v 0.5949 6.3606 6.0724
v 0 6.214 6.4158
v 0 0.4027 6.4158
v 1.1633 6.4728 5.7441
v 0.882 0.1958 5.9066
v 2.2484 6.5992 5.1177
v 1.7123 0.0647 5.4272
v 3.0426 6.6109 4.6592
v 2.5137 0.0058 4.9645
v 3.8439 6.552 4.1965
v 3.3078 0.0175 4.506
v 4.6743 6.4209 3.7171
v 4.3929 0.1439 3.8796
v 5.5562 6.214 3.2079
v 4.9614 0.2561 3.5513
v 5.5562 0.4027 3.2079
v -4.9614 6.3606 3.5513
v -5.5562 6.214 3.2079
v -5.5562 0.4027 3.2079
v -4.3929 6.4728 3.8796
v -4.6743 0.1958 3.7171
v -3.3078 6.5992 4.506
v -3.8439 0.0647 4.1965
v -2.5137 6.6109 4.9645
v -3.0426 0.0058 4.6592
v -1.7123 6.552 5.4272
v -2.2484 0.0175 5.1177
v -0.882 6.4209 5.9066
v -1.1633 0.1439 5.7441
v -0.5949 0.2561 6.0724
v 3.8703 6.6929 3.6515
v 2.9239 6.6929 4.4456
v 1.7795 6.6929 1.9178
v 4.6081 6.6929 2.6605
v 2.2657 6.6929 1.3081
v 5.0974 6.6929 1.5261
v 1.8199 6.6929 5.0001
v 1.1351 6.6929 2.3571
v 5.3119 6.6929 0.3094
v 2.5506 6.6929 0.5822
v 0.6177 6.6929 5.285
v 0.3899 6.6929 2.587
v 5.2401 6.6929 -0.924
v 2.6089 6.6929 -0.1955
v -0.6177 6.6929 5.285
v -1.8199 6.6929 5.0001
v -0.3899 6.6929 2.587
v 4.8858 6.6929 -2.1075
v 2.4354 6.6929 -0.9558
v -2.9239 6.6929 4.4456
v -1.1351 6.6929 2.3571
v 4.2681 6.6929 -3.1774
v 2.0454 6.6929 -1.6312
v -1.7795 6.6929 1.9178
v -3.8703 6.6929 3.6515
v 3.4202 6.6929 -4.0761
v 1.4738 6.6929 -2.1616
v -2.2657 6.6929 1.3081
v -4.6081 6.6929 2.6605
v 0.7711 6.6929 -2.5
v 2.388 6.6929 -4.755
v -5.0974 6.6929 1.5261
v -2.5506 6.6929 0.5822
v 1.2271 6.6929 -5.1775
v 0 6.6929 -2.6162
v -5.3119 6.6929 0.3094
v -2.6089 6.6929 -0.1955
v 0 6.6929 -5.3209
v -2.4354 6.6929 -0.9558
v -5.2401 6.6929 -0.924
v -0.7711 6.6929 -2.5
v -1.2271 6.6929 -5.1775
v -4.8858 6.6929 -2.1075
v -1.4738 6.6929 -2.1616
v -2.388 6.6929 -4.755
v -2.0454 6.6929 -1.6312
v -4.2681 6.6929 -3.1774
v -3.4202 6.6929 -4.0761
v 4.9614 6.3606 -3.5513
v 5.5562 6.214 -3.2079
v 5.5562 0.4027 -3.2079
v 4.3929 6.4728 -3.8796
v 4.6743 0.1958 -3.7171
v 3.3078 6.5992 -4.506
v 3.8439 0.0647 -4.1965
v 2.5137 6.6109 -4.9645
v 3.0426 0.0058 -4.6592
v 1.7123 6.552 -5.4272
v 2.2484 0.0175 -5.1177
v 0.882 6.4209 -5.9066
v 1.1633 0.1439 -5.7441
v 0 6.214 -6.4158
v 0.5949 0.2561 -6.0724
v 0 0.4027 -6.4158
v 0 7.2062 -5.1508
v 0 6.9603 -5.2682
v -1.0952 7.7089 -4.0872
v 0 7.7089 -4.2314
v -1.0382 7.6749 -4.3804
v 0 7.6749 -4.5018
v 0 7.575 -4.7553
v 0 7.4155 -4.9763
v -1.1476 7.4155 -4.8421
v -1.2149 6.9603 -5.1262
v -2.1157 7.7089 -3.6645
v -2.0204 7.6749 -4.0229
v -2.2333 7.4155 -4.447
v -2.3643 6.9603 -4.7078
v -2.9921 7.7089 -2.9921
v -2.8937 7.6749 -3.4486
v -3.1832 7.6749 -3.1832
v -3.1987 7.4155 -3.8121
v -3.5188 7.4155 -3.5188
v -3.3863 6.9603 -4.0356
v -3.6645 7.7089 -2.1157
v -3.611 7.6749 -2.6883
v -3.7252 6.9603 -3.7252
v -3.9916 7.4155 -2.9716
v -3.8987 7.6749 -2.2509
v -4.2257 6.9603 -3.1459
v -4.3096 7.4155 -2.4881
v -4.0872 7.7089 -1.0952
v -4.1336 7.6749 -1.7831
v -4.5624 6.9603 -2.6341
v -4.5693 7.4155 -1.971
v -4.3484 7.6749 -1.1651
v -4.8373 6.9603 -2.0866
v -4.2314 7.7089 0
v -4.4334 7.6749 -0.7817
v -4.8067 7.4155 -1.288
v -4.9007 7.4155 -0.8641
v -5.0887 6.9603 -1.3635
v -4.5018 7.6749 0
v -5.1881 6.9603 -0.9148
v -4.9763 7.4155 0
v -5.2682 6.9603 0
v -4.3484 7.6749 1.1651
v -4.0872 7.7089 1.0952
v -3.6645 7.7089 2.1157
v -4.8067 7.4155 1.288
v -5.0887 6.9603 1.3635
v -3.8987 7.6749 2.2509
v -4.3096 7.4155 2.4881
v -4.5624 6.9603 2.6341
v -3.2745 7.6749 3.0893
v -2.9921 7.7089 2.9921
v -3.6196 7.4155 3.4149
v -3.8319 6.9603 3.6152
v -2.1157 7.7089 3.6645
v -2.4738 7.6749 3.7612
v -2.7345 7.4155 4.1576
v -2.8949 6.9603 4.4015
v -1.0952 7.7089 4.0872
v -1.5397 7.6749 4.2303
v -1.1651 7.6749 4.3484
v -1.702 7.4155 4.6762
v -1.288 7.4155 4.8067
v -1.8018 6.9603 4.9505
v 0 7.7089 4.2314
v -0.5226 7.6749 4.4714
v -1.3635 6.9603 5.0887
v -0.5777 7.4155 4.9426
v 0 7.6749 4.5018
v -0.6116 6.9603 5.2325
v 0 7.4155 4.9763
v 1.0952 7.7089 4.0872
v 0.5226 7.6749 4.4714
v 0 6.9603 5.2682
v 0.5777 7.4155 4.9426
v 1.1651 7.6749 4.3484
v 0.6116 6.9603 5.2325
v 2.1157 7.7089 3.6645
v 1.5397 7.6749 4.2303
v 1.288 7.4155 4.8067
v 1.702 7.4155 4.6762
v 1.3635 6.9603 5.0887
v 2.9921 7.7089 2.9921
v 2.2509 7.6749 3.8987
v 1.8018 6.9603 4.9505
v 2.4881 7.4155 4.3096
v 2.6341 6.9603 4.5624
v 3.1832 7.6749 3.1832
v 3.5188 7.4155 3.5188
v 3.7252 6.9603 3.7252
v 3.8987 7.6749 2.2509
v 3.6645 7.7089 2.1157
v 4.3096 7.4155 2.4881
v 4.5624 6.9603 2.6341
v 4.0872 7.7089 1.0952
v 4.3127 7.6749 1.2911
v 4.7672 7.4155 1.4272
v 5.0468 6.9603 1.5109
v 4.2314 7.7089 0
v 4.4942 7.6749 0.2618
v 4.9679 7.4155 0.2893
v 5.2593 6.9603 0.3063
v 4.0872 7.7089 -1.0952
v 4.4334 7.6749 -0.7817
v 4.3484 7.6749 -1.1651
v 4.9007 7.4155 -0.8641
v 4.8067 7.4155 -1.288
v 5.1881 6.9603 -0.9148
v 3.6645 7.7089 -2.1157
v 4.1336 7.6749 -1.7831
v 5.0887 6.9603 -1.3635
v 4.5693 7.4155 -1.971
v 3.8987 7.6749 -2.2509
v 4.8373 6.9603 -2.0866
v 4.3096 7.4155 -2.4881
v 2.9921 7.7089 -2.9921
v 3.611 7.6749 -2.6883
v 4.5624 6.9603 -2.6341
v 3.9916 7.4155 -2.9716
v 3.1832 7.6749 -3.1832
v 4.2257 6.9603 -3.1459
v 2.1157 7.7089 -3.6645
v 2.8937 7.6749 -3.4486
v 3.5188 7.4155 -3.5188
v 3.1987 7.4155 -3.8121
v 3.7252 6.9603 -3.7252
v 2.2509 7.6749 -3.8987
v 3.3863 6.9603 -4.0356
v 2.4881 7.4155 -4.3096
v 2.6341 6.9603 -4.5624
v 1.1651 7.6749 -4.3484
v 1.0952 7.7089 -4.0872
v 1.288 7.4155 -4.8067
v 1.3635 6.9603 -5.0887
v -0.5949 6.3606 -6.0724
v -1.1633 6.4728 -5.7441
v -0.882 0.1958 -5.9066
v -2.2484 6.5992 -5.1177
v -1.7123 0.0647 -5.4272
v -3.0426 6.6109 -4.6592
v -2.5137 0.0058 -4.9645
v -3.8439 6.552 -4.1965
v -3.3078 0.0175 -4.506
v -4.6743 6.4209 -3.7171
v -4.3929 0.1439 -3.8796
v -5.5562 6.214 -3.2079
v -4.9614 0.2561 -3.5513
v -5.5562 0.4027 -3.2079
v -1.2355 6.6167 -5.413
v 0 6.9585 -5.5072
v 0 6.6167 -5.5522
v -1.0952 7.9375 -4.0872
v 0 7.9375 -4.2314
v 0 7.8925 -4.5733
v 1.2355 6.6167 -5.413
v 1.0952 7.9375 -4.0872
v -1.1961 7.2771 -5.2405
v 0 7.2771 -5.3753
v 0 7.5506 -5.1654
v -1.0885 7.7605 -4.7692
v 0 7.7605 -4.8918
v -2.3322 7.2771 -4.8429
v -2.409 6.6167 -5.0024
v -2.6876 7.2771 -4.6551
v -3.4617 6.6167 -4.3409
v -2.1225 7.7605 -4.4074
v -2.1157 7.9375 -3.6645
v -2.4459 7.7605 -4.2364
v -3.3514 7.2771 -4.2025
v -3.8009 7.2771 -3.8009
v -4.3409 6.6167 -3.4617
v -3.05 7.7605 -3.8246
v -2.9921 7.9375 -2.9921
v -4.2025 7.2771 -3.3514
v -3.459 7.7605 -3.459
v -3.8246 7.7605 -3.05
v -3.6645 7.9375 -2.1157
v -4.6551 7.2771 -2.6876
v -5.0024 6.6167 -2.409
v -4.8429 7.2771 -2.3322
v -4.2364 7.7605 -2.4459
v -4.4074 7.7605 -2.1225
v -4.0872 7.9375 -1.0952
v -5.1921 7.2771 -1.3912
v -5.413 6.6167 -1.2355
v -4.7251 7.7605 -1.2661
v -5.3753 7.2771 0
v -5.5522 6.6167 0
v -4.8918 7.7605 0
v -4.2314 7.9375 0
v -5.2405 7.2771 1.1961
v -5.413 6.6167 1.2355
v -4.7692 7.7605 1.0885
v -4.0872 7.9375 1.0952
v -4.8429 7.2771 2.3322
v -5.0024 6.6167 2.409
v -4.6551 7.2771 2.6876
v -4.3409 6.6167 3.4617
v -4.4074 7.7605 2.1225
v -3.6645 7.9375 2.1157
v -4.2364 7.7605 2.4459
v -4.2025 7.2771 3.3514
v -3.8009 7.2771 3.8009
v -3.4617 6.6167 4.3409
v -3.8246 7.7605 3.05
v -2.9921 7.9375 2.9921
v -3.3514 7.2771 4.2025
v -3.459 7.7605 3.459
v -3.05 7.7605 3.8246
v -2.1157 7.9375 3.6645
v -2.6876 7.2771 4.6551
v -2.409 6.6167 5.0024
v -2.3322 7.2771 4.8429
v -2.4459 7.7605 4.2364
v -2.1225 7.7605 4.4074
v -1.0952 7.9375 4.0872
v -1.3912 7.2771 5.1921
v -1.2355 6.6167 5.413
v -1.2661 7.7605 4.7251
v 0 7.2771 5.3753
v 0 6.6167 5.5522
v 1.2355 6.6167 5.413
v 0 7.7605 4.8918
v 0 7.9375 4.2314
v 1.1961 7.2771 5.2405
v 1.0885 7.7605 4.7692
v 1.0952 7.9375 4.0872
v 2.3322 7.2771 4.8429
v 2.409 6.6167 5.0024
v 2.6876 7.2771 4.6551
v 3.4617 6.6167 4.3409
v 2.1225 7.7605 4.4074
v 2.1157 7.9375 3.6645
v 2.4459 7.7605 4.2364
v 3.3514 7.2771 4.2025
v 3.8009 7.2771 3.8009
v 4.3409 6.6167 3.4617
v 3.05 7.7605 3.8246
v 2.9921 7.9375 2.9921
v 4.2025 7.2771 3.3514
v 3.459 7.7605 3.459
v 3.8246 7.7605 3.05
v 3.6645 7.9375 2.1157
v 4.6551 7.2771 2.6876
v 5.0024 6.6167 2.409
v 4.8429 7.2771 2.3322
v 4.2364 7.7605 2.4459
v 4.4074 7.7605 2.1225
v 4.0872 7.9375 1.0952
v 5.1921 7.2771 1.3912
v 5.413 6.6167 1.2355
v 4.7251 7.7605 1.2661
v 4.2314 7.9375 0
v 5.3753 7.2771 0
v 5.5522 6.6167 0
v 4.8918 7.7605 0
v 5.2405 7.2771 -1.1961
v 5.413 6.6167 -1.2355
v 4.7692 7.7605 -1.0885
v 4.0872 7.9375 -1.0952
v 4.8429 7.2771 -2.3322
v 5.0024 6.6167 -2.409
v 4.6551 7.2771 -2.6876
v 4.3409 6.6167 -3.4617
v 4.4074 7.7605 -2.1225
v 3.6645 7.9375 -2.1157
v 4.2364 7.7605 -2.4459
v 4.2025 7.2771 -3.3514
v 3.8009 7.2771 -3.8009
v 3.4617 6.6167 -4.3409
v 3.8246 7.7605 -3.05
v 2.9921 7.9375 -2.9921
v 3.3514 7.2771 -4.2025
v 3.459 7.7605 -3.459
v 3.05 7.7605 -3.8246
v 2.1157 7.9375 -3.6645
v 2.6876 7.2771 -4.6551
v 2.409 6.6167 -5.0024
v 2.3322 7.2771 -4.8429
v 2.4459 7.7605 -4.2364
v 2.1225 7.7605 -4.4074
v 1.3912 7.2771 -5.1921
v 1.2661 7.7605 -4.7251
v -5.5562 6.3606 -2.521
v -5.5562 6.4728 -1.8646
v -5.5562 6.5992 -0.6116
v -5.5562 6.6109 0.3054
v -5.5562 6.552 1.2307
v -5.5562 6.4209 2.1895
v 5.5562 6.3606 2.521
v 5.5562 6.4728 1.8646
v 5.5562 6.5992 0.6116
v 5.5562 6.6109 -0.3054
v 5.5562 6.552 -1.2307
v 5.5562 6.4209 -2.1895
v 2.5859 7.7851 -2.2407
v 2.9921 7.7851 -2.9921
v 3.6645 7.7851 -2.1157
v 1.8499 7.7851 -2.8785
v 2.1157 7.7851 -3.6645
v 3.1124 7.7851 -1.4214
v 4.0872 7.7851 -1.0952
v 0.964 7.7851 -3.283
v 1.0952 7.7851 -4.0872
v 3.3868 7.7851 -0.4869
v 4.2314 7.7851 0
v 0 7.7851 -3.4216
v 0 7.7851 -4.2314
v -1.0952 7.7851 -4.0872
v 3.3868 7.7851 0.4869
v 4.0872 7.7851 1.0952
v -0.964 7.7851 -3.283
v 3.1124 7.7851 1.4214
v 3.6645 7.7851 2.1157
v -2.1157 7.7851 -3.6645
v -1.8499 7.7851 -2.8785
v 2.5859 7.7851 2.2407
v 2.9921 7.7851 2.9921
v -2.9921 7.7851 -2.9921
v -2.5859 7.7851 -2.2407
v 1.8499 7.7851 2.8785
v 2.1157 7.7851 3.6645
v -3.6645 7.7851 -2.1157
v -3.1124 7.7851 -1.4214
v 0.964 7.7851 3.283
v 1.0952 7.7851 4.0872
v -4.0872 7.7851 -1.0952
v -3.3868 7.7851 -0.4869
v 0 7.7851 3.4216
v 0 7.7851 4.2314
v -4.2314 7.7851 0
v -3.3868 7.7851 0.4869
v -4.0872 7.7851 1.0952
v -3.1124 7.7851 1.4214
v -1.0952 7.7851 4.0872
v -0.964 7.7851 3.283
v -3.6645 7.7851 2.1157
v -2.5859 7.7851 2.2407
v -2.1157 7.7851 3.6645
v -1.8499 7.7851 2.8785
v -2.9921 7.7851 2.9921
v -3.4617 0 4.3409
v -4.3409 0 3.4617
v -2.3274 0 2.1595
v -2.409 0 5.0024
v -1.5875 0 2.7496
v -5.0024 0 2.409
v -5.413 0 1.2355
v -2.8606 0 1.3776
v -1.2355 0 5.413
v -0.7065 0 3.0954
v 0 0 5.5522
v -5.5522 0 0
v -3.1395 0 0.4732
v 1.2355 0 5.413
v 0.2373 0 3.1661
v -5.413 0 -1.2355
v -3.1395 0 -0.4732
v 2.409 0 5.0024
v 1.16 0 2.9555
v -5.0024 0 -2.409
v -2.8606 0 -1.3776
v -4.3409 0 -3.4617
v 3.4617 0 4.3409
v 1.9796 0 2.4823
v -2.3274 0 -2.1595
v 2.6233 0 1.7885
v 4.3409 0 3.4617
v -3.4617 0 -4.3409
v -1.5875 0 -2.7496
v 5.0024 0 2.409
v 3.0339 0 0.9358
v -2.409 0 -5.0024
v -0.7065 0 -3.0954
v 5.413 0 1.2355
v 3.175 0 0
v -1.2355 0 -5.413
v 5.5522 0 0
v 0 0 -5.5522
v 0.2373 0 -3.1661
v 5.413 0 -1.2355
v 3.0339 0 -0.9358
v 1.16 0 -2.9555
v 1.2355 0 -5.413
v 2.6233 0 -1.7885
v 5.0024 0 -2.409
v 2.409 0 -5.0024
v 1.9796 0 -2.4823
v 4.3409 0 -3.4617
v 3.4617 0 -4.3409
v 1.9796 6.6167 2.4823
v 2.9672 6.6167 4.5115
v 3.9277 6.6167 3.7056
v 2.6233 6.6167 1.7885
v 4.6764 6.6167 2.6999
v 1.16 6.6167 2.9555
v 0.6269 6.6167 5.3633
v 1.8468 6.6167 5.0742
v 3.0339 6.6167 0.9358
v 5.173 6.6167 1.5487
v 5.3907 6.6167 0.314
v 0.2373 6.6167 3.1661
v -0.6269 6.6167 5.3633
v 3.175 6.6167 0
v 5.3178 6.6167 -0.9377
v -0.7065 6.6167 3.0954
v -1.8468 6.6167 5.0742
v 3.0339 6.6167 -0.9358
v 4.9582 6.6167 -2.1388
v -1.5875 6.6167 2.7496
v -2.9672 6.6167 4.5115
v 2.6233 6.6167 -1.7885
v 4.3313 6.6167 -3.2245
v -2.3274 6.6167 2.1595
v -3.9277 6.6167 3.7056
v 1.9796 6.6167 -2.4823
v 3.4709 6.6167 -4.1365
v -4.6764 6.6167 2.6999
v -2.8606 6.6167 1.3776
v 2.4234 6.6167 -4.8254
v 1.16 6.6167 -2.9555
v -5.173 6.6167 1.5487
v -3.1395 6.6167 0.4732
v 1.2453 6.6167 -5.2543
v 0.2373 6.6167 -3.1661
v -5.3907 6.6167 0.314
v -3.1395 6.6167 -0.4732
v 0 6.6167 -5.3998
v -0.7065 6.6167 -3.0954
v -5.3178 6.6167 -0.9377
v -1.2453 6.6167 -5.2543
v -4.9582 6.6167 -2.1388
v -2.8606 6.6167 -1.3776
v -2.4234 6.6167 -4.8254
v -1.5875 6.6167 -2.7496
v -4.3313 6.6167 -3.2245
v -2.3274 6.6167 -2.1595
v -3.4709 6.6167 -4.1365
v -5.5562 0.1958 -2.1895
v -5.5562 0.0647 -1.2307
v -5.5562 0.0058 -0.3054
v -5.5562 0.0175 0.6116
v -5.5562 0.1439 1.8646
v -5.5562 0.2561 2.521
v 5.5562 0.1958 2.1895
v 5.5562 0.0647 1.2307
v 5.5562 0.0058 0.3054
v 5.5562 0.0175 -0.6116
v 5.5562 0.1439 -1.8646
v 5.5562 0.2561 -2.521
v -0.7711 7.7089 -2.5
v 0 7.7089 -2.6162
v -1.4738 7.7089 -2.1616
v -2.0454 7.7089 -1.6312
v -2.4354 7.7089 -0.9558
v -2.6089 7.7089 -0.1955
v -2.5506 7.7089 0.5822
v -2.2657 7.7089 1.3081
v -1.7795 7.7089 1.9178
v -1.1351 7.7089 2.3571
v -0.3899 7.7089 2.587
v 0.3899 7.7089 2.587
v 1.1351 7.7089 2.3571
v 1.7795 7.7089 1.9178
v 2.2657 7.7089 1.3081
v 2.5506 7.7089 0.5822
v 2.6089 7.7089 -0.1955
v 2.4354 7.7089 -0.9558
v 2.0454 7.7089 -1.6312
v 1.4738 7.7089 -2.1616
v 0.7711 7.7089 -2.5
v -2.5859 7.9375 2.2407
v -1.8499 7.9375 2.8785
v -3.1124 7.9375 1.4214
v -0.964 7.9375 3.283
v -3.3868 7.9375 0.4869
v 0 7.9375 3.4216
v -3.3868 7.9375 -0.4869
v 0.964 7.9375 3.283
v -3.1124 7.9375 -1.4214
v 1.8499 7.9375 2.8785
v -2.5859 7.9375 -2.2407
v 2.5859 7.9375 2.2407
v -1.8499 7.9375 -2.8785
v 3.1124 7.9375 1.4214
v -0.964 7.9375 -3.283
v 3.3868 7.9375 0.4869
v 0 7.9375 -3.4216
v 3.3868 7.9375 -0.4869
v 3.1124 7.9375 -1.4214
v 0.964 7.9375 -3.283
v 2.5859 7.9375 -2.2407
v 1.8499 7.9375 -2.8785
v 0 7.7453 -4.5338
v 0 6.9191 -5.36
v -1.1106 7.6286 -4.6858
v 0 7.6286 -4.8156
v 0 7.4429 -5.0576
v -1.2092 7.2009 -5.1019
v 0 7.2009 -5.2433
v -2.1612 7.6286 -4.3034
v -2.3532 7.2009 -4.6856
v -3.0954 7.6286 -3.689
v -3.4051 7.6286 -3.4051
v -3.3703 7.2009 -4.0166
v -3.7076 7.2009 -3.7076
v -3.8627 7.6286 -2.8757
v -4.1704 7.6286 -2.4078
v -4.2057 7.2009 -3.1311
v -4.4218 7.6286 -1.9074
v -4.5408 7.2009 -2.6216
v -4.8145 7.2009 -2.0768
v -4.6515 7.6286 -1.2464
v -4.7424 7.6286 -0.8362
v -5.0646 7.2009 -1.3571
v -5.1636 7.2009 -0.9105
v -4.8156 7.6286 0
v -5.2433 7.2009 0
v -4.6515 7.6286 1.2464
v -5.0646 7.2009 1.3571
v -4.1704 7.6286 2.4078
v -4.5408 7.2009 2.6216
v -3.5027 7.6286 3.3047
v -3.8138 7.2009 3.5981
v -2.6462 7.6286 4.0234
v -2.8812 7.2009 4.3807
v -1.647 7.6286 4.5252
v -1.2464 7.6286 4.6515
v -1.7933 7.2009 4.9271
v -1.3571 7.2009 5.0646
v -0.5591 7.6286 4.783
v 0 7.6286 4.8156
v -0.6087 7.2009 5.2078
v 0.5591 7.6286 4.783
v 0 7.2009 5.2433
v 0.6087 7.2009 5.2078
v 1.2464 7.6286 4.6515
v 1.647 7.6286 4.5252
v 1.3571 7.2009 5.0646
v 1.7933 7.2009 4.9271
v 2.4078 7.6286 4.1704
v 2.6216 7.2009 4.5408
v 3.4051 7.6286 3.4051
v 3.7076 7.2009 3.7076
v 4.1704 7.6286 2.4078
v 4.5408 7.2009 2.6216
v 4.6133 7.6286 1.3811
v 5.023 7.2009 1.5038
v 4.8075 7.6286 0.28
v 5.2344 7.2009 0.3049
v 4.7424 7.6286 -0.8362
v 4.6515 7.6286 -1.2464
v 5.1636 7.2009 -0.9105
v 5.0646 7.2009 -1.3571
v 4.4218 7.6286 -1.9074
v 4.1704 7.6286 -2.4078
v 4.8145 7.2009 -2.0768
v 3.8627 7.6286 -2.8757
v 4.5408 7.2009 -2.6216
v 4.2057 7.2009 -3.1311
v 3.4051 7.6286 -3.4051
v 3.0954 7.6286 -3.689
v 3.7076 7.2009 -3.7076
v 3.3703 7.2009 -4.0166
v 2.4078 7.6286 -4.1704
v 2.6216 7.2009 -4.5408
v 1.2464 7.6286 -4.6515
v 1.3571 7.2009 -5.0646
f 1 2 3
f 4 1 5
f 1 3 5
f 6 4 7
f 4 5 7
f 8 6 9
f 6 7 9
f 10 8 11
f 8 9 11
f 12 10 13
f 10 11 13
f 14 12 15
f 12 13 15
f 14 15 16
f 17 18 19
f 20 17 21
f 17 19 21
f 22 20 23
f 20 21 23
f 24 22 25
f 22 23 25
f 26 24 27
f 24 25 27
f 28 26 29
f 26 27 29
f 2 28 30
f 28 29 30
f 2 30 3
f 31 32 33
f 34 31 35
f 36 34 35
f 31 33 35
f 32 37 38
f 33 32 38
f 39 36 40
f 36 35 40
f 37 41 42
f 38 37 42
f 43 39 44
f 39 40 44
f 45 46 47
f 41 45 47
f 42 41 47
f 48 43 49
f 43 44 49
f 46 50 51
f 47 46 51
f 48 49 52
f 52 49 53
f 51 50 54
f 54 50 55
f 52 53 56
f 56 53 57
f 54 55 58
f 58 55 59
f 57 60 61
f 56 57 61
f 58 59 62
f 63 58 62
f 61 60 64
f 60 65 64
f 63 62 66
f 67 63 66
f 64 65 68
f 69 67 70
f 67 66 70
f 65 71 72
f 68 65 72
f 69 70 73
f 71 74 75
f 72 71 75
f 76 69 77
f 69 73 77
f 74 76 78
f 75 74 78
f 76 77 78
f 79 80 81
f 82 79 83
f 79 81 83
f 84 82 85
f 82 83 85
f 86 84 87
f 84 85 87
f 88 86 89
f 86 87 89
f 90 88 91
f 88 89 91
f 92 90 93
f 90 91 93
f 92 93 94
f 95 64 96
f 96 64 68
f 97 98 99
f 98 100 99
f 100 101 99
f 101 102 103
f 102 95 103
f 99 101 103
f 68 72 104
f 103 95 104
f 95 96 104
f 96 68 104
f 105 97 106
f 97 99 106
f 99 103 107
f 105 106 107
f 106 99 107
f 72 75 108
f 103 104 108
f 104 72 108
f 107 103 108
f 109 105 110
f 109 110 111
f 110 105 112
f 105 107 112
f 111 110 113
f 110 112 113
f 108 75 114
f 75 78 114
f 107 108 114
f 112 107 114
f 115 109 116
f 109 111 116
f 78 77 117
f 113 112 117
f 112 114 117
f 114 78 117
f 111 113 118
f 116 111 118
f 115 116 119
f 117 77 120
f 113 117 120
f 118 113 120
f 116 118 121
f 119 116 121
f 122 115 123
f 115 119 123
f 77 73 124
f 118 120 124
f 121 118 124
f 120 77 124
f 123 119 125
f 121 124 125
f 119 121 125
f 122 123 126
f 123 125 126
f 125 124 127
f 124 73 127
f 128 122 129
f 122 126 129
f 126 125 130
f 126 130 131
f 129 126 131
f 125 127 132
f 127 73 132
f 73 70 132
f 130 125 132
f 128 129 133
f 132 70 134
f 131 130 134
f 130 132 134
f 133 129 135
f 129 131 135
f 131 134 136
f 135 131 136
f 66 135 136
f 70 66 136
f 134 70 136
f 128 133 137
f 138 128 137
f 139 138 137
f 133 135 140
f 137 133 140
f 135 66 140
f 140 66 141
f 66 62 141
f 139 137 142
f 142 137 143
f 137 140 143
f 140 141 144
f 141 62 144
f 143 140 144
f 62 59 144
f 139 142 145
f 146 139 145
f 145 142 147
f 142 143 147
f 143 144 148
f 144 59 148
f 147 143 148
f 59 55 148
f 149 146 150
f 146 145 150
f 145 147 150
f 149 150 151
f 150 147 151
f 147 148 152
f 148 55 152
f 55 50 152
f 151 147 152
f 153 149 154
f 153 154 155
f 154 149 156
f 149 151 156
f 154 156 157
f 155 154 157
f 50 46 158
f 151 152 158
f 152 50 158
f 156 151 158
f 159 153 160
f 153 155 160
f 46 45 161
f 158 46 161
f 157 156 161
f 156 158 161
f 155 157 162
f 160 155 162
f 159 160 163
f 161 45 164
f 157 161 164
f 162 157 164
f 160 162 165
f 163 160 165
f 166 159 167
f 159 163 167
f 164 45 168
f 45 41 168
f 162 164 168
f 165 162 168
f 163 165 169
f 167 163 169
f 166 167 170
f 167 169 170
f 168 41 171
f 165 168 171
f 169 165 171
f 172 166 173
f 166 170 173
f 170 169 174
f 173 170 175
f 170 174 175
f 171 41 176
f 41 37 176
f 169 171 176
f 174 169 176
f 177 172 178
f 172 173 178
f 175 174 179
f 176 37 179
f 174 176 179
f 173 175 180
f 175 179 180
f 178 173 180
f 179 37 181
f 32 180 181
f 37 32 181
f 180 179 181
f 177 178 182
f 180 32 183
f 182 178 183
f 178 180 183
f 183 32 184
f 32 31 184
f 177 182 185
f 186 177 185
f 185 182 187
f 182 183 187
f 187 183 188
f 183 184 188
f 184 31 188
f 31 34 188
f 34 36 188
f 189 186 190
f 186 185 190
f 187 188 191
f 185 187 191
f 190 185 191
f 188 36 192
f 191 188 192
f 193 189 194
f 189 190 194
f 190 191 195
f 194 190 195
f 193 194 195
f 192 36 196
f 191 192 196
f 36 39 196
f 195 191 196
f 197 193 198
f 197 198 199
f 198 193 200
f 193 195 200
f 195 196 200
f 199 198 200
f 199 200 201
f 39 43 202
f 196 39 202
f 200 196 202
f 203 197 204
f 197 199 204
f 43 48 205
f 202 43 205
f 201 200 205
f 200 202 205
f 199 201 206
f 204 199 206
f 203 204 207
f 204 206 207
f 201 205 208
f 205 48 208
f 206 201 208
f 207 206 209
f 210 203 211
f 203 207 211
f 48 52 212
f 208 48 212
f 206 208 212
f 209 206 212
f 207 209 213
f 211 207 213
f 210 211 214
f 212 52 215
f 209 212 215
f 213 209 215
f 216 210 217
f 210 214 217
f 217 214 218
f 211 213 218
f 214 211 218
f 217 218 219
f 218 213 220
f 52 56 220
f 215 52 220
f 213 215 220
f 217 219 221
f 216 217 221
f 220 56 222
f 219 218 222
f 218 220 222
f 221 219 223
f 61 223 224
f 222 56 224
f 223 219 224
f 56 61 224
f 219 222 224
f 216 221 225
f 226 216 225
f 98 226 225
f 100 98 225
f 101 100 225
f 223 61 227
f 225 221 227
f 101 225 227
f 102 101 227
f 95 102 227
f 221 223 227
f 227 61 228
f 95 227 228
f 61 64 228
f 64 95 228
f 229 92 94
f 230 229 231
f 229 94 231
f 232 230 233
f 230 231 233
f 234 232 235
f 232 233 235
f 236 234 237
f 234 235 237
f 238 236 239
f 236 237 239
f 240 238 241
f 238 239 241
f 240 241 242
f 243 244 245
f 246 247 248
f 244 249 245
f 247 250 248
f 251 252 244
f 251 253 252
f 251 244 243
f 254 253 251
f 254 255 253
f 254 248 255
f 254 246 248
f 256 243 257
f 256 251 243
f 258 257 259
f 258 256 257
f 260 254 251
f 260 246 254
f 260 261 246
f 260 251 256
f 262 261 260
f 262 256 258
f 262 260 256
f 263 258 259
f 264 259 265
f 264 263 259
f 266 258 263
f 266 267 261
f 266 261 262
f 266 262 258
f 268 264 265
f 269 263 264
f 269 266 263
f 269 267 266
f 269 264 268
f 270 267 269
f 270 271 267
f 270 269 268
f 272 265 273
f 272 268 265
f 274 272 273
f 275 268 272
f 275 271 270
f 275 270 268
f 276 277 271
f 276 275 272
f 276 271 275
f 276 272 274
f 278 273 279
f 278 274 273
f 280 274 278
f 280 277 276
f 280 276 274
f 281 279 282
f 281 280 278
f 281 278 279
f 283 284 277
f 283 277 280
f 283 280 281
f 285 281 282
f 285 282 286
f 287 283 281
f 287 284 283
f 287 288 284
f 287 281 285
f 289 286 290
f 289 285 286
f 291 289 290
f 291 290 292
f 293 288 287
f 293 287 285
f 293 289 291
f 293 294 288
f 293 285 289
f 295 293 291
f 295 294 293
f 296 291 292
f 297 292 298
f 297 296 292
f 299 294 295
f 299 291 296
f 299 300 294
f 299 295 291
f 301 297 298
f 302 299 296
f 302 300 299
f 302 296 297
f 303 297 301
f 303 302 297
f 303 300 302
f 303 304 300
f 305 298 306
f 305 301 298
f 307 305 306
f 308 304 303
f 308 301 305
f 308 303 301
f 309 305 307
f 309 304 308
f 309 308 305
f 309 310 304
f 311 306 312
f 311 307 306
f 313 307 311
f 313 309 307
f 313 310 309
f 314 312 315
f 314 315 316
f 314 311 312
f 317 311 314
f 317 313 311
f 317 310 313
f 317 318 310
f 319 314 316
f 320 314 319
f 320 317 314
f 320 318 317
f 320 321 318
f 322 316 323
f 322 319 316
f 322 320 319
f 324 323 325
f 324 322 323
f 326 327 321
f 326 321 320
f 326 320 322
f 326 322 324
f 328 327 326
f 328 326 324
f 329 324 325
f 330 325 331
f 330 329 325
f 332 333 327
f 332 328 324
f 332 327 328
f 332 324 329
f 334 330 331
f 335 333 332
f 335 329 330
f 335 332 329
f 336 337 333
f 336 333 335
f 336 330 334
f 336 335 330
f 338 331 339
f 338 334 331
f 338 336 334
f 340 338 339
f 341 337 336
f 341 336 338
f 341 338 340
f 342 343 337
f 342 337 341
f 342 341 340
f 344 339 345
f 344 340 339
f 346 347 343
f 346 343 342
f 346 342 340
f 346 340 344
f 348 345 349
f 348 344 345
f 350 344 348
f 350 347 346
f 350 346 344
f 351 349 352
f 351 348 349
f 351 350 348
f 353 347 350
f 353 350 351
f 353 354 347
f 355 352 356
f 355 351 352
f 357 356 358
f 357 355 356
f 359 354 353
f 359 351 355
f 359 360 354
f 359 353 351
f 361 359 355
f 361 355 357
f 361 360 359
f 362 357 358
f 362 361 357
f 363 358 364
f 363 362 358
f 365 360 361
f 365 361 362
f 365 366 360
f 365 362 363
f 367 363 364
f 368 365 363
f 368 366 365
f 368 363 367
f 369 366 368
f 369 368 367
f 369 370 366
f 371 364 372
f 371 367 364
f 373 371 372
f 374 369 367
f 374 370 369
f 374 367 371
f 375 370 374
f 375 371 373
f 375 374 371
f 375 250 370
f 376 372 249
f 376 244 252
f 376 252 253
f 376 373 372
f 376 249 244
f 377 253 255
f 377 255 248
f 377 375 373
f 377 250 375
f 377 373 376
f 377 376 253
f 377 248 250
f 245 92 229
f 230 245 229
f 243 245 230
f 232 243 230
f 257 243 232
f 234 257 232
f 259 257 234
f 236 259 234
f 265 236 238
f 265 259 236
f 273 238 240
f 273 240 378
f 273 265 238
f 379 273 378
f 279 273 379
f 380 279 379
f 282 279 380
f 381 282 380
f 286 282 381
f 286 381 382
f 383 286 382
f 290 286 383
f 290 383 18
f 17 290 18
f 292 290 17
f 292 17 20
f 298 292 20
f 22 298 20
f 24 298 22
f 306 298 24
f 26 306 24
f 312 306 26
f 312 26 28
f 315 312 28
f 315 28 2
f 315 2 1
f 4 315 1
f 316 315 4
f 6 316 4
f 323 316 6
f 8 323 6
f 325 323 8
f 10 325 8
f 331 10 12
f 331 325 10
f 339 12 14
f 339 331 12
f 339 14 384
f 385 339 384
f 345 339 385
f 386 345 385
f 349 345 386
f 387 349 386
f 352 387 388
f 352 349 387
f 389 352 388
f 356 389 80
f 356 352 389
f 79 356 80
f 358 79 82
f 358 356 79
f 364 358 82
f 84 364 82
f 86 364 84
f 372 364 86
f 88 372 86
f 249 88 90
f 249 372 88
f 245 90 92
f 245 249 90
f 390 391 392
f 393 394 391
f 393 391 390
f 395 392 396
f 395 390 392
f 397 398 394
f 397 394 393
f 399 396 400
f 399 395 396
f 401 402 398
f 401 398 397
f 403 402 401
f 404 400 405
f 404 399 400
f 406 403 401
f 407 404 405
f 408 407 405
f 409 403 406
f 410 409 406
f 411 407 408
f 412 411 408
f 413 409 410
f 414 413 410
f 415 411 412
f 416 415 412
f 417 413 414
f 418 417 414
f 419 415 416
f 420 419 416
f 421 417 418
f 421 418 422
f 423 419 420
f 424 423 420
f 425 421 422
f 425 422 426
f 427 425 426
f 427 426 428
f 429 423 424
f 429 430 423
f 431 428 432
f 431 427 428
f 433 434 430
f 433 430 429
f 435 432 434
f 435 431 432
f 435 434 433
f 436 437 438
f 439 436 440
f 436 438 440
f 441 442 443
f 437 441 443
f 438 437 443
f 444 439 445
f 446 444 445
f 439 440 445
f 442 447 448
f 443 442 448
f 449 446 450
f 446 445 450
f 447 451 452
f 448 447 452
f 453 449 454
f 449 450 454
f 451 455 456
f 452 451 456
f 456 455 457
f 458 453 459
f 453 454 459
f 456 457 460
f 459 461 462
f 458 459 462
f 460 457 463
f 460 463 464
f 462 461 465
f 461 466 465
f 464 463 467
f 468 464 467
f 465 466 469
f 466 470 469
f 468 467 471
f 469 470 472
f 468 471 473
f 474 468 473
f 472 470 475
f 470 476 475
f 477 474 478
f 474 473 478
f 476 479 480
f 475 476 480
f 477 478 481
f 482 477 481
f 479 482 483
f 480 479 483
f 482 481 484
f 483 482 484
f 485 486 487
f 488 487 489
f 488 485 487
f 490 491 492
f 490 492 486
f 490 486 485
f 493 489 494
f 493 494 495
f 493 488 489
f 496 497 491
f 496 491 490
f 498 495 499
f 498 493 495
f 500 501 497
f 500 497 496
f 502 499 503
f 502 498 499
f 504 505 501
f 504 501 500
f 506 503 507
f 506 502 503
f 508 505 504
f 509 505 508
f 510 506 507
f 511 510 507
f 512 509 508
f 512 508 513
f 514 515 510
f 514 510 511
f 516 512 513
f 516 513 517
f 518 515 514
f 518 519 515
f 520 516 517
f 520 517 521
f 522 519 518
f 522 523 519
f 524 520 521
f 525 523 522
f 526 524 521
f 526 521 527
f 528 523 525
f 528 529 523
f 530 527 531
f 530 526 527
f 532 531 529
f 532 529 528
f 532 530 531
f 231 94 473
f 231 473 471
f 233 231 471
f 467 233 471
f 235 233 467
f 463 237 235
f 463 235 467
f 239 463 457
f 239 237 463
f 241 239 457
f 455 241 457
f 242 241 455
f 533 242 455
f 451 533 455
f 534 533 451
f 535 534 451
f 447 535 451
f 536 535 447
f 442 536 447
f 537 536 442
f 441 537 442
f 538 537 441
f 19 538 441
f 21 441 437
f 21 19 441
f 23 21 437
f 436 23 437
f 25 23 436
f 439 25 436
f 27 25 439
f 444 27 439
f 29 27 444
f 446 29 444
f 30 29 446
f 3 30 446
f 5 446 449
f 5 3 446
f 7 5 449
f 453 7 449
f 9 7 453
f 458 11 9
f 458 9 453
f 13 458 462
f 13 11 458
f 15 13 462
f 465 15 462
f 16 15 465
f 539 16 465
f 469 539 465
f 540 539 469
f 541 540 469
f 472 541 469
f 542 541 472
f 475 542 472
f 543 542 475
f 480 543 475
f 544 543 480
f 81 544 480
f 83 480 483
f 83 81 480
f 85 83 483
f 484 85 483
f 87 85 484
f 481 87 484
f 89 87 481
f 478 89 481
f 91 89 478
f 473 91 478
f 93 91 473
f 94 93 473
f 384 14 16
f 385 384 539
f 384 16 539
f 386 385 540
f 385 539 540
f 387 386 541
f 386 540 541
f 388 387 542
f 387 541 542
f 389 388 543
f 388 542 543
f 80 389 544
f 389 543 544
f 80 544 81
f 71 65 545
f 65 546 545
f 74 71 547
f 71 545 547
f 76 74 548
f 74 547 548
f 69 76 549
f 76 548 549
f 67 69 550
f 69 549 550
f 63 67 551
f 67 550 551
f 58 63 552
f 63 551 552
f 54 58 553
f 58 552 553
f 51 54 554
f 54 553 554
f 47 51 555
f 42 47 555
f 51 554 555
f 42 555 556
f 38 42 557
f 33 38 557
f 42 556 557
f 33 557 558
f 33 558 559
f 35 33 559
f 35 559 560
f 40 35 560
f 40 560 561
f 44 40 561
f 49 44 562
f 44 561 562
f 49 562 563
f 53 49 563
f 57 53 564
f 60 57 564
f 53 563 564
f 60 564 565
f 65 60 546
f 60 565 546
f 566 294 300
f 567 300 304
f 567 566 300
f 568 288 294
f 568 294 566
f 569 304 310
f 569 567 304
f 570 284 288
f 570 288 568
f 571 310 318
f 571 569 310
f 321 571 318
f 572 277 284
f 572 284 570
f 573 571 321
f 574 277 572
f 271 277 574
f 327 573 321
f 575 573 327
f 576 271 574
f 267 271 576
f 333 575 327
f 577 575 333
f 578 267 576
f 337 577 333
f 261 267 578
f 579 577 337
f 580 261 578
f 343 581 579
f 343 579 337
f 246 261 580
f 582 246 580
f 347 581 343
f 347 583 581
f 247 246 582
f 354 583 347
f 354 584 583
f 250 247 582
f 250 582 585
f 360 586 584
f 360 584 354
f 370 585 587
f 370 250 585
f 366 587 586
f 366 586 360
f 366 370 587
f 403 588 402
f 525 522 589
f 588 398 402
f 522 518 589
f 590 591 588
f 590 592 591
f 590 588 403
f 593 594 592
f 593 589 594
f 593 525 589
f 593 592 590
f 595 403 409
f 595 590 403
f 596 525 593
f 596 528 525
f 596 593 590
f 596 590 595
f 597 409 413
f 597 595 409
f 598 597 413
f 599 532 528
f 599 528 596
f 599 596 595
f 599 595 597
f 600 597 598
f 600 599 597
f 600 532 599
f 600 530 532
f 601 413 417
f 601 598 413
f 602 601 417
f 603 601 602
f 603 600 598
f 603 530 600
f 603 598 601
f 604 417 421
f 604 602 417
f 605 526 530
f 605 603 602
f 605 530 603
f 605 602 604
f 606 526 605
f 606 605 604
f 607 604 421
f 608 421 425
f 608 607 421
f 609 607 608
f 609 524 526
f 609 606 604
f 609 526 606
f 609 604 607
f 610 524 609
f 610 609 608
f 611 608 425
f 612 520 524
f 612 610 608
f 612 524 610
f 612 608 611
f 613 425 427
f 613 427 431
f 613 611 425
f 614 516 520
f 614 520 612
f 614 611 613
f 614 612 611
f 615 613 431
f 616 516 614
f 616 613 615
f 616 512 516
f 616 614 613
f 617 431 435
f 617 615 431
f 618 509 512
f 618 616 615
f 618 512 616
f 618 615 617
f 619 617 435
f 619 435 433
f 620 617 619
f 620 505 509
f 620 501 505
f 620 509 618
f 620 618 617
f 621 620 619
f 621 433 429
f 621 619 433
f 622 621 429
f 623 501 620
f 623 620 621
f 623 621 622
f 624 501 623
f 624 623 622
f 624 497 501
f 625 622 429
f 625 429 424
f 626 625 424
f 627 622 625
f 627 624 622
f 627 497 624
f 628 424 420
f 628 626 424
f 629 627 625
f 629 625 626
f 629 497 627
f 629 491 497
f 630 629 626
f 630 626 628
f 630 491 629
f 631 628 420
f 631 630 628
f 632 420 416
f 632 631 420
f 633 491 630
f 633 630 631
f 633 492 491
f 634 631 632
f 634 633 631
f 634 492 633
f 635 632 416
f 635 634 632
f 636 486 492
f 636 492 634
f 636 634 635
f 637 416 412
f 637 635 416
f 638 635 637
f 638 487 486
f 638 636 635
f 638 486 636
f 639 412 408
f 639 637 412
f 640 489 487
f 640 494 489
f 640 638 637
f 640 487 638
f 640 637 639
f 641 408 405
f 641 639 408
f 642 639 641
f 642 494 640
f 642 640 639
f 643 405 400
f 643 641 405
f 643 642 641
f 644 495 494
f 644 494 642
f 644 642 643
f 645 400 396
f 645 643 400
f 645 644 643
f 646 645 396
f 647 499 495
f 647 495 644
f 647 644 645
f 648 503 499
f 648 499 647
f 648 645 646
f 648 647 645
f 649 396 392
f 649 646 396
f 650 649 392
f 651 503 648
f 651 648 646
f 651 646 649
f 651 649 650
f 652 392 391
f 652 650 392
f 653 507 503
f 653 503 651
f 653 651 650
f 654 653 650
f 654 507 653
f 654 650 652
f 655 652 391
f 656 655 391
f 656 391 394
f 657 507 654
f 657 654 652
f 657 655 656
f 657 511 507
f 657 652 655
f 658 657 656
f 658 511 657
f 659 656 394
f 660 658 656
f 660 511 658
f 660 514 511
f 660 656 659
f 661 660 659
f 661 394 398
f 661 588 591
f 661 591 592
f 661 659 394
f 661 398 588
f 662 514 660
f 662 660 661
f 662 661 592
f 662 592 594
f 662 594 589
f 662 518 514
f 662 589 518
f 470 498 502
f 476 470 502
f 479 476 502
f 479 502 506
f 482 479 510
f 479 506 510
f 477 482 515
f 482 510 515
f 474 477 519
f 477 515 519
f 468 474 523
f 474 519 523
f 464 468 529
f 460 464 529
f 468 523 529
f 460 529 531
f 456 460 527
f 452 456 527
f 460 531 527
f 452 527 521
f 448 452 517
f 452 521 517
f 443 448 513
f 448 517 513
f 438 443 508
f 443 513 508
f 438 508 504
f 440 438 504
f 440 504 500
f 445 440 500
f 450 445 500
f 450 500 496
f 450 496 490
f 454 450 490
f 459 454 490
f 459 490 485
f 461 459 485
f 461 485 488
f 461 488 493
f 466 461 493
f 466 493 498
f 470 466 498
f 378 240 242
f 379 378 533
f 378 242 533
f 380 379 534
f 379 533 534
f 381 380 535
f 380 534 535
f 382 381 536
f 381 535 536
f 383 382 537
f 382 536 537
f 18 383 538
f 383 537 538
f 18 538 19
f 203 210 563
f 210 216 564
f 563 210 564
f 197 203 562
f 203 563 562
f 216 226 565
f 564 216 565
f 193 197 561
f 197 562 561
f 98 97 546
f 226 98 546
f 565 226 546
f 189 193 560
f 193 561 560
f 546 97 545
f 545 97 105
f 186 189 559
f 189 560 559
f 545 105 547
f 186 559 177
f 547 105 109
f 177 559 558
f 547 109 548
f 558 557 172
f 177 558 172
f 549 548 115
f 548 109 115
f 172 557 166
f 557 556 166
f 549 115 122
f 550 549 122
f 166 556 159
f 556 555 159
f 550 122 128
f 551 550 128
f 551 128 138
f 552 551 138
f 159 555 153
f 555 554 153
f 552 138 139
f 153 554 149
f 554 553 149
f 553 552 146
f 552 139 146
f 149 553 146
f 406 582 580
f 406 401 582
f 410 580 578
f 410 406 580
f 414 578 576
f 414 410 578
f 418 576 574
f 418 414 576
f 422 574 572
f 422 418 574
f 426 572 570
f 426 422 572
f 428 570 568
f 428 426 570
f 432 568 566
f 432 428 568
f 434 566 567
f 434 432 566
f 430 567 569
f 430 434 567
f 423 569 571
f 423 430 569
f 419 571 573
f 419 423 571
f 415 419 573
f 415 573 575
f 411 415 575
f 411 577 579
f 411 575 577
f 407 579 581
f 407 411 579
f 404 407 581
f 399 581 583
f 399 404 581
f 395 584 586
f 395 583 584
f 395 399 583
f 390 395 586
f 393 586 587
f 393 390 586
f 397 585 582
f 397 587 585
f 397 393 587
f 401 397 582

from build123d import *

# Parameters (mm, degrees)
BOSS_EXTRUDE1_DEPTH = 7.9375
SKETCH2_R           = 3.175
CUT_EXTRUDE1_DEPTH  = 8.9375


with BuildPart() as part:
    # Sketch1 → Boss-Extrude1 (new body)
    with BuildSketch(Plane(origin=(0, 0, 0), x_dir=(1, 0, 0), z_dir=(0, 1, 0))):
        Polygon((0, 6.415804866), (-5.55625, 3.207902433), (-5.55625, -3.207902433), (0, -6.415804866), (5.55625, -3.207902433), (5.55625, 3.207902433), align=None)
    extrude(amount=BOSS_EXTRUDE1_DEPTH)

    # Sketch2 → Cut-Extrude1 (cut, through all)
    with BuildSketch(Plane(origin=(0, 7.9375, 0), x_dir=(1, 0, 0), z_dir=(0, 1, 0))):
        Circle(SKETCH2_R)
    extrude(amount=-CUT_EXTRUDE1_DEPTH, mode=Mode.SUBTRACT)

    # Sketch4 → Cut-Revolve1 (revolve, cut)
    with BuildSketch(Plane(origin=(0, 0, 0), x_dir=(0, 0, -1), z_dir=(1, 0, 0))):
        with BuildLine():
            Line((0, 0), (5.552204866, 0))
            Line((5.552204866, 0), (6.415804866, 0.402703294))
            Line((6.415804866, 0.402703294), (6.415804866, 6.213996706))
            Line((6.415804866, 6.213996706), (5.552204866, 6.6167))
            ThreePointArc((5.552204866, 6.6167), (5.165351503, 7.550646637), (4.231404866, 7.9375))
            Line((4.231404866, 7.9375), (4.231404866, 9.2075))
            Line((4.231404866, 9.2075), (7.685804866, 9.2075))
            Line((7.685804866, 9.2075), (7.685804866, -1.27))
            Line((7.685804866, -1.27), (0, -1.27))
            Line((0, -1.27), (0, 0))
        make_face()
    revolve(axis=Axis((0, 0, 0), (0, 1, 0)), mode=Mode.SUBTRACT)

    # Sketch5 → Cut-Revolve2 (revolve, cut)
    with BuildSketch(Plane(origin=(0, 0, 0), x_dir=(0, 0, -1), z_dir=(1, 0, 0))):
        with BuildLine():
            Line((5.399804866, 6.6167), (0, 6.6167))
            Line((0, 6.6167), (0, 9.1567))
            Line((0, 9.1567), (3.421620792, 9.1567))
            Line((3.421620792, 9.1567), (3.421620792, 7.7851))
            Line((3.421620792, 7.7851), (4.231404866, 7.7851))
            ThreePointArc((4.231404866, 7.7851), (5.05758843, 7.442883563), (5.399804866, 6.6167))
        make_face()
    revolve(axis=Axis((0, 6.6167, 0), (0, 1, 0)), mode=Mode.SUBTRACT)


with BuildPart() as body_2:
    # Sketch6 → Revolve1 (revolve)
    with BuildSketch(Plane(origin=(0, 0, 0), x_dir=(0, 0, -1), z_dir=(1, 0, 0))):
        with BuildLine():
            Line((2.6162, 6.6929), (2.6162, 7.7089))
            Line((2.6162, 7.7089), (4.231404866, 7.7089))
            ThreePointArc((4.231404866, 7.7089), (4.976279084, 7.415488608), (5.320943484, 6.6929))
            Line((5.320943484, 6.6929), (2.6162, 6.6929))
        make_face()
    revolve(axis=Axis((0, 0, 0), (0, 1, 0)))


solid = Compound([part.part, body_2.part])
